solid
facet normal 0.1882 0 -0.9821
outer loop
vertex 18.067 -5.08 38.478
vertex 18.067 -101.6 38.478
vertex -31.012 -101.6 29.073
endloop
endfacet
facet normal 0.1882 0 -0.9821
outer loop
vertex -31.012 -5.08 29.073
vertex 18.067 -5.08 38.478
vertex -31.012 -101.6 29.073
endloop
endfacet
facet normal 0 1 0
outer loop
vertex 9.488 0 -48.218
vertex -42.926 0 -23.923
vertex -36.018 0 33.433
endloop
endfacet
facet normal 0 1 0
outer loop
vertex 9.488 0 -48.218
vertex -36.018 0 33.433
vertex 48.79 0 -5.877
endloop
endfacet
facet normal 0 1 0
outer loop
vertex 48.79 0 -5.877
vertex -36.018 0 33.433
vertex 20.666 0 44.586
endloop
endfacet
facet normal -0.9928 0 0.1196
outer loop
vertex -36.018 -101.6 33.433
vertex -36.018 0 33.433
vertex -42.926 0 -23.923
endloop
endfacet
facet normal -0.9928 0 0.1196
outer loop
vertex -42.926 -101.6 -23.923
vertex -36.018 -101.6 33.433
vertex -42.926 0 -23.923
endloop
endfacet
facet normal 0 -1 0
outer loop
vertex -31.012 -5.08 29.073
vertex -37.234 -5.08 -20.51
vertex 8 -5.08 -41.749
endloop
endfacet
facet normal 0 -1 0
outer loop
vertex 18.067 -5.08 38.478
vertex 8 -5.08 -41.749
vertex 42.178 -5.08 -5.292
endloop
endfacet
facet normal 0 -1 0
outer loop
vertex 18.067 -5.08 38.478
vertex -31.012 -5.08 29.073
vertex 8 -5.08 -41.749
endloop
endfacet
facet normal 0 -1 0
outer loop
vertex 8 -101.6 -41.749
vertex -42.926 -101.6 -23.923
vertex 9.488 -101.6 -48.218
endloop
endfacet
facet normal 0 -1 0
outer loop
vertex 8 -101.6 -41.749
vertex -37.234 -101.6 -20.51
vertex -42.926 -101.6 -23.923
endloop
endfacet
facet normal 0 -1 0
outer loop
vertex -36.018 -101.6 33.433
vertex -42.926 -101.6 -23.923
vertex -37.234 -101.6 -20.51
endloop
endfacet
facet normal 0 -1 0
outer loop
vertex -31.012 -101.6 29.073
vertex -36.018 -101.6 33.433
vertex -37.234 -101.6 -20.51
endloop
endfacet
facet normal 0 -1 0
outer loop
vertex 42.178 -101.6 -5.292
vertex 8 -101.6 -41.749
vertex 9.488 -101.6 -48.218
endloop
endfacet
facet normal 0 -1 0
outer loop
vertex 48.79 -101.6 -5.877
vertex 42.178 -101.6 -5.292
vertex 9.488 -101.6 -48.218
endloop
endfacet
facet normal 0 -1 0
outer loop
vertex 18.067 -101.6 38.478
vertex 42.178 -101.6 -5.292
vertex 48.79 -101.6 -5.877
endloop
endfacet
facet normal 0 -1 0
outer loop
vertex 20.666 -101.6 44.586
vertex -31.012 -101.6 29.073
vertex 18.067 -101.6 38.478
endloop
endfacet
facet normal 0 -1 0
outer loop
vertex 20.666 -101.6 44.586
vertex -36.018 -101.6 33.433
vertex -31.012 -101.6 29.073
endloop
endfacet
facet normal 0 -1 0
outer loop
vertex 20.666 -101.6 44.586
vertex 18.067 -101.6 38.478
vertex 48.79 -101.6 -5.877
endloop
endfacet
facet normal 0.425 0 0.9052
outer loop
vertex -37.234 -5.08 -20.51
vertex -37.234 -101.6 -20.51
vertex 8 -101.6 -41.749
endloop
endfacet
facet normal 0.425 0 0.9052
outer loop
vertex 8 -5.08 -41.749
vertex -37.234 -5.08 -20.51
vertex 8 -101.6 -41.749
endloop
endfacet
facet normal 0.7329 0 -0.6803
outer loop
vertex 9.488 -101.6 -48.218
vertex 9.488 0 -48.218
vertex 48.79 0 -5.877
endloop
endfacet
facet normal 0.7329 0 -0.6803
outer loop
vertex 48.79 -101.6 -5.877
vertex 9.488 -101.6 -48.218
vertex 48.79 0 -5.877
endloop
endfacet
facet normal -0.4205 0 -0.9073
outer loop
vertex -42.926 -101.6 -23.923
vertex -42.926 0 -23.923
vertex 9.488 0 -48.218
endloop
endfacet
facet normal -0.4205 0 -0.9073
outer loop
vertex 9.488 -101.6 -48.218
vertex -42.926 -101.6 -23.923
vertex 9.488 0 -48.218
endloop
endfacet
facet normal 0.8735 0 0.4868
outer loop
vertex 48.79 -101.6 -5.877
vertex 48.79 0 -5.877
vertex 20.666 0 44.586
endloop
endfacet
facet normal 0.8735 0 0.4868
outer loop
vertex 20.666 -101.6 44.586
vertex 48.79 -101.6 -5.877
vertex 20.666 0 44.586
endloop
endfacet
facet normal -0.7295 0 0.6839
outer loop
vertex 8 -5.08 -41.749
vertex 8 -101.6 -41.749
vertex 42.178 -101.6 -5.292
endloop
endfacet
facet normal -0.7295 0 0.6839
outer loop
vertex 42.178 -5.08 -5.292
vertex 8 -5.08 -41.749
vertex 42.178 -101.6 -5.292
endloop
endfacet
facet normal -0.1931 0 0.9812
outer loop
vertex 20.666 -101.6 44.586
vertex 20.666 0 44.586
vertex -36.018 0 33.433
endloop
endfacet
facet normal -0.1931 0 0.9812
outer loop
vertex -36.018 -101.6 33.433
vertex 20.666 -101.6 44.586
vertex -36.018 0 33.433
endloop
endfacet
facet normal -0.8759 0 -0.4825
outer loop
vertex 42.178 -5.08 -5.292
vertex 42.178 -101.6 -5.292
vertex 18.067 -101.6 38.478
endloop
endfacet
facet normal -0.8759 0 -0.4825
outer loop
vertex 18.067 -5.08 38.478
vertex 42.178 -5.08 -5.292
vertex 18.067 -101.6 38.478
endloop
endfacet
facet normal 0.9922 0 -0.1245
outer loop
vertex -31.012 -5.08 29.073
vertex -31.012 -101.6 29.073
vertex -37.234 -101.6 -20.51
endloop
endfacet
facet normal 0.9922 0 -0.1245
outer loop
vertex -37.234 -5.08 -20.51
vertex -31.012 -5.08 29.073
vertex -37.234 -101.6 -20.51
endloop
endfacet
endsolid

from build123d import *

# Parameters (mm, degrees)
F1_DEPTH = 101.6
F3_DEPTH = 96.52


with BuildPart() as f1:
    # F0 (on Front) → F1 (new body)
    with BuildSketch(Plane.XZ):
        Polygon((48.790029, -5.877001), (20.666308, 44.585982), (-36.017548, 33.432653), (-42.926377, -23.923466), (9.487588, -48.218168), align=None)
    extrude(amount=F1_DEPTH)

    # F2 (on face) → F3 (cut)
    with BuildSketch(Plane.XZ.offset(101.6)):
        Polygon((42.178061, -5.292378), (18.067088, 38.478285), (-31.011986, 29.073266), (-37.23355, -20.510018), (8.000387, -41.749154), align=None)
    extrude(amount=-F3_DEPTH, mode=Mode.SUBTRACT)


solid = f1.part
